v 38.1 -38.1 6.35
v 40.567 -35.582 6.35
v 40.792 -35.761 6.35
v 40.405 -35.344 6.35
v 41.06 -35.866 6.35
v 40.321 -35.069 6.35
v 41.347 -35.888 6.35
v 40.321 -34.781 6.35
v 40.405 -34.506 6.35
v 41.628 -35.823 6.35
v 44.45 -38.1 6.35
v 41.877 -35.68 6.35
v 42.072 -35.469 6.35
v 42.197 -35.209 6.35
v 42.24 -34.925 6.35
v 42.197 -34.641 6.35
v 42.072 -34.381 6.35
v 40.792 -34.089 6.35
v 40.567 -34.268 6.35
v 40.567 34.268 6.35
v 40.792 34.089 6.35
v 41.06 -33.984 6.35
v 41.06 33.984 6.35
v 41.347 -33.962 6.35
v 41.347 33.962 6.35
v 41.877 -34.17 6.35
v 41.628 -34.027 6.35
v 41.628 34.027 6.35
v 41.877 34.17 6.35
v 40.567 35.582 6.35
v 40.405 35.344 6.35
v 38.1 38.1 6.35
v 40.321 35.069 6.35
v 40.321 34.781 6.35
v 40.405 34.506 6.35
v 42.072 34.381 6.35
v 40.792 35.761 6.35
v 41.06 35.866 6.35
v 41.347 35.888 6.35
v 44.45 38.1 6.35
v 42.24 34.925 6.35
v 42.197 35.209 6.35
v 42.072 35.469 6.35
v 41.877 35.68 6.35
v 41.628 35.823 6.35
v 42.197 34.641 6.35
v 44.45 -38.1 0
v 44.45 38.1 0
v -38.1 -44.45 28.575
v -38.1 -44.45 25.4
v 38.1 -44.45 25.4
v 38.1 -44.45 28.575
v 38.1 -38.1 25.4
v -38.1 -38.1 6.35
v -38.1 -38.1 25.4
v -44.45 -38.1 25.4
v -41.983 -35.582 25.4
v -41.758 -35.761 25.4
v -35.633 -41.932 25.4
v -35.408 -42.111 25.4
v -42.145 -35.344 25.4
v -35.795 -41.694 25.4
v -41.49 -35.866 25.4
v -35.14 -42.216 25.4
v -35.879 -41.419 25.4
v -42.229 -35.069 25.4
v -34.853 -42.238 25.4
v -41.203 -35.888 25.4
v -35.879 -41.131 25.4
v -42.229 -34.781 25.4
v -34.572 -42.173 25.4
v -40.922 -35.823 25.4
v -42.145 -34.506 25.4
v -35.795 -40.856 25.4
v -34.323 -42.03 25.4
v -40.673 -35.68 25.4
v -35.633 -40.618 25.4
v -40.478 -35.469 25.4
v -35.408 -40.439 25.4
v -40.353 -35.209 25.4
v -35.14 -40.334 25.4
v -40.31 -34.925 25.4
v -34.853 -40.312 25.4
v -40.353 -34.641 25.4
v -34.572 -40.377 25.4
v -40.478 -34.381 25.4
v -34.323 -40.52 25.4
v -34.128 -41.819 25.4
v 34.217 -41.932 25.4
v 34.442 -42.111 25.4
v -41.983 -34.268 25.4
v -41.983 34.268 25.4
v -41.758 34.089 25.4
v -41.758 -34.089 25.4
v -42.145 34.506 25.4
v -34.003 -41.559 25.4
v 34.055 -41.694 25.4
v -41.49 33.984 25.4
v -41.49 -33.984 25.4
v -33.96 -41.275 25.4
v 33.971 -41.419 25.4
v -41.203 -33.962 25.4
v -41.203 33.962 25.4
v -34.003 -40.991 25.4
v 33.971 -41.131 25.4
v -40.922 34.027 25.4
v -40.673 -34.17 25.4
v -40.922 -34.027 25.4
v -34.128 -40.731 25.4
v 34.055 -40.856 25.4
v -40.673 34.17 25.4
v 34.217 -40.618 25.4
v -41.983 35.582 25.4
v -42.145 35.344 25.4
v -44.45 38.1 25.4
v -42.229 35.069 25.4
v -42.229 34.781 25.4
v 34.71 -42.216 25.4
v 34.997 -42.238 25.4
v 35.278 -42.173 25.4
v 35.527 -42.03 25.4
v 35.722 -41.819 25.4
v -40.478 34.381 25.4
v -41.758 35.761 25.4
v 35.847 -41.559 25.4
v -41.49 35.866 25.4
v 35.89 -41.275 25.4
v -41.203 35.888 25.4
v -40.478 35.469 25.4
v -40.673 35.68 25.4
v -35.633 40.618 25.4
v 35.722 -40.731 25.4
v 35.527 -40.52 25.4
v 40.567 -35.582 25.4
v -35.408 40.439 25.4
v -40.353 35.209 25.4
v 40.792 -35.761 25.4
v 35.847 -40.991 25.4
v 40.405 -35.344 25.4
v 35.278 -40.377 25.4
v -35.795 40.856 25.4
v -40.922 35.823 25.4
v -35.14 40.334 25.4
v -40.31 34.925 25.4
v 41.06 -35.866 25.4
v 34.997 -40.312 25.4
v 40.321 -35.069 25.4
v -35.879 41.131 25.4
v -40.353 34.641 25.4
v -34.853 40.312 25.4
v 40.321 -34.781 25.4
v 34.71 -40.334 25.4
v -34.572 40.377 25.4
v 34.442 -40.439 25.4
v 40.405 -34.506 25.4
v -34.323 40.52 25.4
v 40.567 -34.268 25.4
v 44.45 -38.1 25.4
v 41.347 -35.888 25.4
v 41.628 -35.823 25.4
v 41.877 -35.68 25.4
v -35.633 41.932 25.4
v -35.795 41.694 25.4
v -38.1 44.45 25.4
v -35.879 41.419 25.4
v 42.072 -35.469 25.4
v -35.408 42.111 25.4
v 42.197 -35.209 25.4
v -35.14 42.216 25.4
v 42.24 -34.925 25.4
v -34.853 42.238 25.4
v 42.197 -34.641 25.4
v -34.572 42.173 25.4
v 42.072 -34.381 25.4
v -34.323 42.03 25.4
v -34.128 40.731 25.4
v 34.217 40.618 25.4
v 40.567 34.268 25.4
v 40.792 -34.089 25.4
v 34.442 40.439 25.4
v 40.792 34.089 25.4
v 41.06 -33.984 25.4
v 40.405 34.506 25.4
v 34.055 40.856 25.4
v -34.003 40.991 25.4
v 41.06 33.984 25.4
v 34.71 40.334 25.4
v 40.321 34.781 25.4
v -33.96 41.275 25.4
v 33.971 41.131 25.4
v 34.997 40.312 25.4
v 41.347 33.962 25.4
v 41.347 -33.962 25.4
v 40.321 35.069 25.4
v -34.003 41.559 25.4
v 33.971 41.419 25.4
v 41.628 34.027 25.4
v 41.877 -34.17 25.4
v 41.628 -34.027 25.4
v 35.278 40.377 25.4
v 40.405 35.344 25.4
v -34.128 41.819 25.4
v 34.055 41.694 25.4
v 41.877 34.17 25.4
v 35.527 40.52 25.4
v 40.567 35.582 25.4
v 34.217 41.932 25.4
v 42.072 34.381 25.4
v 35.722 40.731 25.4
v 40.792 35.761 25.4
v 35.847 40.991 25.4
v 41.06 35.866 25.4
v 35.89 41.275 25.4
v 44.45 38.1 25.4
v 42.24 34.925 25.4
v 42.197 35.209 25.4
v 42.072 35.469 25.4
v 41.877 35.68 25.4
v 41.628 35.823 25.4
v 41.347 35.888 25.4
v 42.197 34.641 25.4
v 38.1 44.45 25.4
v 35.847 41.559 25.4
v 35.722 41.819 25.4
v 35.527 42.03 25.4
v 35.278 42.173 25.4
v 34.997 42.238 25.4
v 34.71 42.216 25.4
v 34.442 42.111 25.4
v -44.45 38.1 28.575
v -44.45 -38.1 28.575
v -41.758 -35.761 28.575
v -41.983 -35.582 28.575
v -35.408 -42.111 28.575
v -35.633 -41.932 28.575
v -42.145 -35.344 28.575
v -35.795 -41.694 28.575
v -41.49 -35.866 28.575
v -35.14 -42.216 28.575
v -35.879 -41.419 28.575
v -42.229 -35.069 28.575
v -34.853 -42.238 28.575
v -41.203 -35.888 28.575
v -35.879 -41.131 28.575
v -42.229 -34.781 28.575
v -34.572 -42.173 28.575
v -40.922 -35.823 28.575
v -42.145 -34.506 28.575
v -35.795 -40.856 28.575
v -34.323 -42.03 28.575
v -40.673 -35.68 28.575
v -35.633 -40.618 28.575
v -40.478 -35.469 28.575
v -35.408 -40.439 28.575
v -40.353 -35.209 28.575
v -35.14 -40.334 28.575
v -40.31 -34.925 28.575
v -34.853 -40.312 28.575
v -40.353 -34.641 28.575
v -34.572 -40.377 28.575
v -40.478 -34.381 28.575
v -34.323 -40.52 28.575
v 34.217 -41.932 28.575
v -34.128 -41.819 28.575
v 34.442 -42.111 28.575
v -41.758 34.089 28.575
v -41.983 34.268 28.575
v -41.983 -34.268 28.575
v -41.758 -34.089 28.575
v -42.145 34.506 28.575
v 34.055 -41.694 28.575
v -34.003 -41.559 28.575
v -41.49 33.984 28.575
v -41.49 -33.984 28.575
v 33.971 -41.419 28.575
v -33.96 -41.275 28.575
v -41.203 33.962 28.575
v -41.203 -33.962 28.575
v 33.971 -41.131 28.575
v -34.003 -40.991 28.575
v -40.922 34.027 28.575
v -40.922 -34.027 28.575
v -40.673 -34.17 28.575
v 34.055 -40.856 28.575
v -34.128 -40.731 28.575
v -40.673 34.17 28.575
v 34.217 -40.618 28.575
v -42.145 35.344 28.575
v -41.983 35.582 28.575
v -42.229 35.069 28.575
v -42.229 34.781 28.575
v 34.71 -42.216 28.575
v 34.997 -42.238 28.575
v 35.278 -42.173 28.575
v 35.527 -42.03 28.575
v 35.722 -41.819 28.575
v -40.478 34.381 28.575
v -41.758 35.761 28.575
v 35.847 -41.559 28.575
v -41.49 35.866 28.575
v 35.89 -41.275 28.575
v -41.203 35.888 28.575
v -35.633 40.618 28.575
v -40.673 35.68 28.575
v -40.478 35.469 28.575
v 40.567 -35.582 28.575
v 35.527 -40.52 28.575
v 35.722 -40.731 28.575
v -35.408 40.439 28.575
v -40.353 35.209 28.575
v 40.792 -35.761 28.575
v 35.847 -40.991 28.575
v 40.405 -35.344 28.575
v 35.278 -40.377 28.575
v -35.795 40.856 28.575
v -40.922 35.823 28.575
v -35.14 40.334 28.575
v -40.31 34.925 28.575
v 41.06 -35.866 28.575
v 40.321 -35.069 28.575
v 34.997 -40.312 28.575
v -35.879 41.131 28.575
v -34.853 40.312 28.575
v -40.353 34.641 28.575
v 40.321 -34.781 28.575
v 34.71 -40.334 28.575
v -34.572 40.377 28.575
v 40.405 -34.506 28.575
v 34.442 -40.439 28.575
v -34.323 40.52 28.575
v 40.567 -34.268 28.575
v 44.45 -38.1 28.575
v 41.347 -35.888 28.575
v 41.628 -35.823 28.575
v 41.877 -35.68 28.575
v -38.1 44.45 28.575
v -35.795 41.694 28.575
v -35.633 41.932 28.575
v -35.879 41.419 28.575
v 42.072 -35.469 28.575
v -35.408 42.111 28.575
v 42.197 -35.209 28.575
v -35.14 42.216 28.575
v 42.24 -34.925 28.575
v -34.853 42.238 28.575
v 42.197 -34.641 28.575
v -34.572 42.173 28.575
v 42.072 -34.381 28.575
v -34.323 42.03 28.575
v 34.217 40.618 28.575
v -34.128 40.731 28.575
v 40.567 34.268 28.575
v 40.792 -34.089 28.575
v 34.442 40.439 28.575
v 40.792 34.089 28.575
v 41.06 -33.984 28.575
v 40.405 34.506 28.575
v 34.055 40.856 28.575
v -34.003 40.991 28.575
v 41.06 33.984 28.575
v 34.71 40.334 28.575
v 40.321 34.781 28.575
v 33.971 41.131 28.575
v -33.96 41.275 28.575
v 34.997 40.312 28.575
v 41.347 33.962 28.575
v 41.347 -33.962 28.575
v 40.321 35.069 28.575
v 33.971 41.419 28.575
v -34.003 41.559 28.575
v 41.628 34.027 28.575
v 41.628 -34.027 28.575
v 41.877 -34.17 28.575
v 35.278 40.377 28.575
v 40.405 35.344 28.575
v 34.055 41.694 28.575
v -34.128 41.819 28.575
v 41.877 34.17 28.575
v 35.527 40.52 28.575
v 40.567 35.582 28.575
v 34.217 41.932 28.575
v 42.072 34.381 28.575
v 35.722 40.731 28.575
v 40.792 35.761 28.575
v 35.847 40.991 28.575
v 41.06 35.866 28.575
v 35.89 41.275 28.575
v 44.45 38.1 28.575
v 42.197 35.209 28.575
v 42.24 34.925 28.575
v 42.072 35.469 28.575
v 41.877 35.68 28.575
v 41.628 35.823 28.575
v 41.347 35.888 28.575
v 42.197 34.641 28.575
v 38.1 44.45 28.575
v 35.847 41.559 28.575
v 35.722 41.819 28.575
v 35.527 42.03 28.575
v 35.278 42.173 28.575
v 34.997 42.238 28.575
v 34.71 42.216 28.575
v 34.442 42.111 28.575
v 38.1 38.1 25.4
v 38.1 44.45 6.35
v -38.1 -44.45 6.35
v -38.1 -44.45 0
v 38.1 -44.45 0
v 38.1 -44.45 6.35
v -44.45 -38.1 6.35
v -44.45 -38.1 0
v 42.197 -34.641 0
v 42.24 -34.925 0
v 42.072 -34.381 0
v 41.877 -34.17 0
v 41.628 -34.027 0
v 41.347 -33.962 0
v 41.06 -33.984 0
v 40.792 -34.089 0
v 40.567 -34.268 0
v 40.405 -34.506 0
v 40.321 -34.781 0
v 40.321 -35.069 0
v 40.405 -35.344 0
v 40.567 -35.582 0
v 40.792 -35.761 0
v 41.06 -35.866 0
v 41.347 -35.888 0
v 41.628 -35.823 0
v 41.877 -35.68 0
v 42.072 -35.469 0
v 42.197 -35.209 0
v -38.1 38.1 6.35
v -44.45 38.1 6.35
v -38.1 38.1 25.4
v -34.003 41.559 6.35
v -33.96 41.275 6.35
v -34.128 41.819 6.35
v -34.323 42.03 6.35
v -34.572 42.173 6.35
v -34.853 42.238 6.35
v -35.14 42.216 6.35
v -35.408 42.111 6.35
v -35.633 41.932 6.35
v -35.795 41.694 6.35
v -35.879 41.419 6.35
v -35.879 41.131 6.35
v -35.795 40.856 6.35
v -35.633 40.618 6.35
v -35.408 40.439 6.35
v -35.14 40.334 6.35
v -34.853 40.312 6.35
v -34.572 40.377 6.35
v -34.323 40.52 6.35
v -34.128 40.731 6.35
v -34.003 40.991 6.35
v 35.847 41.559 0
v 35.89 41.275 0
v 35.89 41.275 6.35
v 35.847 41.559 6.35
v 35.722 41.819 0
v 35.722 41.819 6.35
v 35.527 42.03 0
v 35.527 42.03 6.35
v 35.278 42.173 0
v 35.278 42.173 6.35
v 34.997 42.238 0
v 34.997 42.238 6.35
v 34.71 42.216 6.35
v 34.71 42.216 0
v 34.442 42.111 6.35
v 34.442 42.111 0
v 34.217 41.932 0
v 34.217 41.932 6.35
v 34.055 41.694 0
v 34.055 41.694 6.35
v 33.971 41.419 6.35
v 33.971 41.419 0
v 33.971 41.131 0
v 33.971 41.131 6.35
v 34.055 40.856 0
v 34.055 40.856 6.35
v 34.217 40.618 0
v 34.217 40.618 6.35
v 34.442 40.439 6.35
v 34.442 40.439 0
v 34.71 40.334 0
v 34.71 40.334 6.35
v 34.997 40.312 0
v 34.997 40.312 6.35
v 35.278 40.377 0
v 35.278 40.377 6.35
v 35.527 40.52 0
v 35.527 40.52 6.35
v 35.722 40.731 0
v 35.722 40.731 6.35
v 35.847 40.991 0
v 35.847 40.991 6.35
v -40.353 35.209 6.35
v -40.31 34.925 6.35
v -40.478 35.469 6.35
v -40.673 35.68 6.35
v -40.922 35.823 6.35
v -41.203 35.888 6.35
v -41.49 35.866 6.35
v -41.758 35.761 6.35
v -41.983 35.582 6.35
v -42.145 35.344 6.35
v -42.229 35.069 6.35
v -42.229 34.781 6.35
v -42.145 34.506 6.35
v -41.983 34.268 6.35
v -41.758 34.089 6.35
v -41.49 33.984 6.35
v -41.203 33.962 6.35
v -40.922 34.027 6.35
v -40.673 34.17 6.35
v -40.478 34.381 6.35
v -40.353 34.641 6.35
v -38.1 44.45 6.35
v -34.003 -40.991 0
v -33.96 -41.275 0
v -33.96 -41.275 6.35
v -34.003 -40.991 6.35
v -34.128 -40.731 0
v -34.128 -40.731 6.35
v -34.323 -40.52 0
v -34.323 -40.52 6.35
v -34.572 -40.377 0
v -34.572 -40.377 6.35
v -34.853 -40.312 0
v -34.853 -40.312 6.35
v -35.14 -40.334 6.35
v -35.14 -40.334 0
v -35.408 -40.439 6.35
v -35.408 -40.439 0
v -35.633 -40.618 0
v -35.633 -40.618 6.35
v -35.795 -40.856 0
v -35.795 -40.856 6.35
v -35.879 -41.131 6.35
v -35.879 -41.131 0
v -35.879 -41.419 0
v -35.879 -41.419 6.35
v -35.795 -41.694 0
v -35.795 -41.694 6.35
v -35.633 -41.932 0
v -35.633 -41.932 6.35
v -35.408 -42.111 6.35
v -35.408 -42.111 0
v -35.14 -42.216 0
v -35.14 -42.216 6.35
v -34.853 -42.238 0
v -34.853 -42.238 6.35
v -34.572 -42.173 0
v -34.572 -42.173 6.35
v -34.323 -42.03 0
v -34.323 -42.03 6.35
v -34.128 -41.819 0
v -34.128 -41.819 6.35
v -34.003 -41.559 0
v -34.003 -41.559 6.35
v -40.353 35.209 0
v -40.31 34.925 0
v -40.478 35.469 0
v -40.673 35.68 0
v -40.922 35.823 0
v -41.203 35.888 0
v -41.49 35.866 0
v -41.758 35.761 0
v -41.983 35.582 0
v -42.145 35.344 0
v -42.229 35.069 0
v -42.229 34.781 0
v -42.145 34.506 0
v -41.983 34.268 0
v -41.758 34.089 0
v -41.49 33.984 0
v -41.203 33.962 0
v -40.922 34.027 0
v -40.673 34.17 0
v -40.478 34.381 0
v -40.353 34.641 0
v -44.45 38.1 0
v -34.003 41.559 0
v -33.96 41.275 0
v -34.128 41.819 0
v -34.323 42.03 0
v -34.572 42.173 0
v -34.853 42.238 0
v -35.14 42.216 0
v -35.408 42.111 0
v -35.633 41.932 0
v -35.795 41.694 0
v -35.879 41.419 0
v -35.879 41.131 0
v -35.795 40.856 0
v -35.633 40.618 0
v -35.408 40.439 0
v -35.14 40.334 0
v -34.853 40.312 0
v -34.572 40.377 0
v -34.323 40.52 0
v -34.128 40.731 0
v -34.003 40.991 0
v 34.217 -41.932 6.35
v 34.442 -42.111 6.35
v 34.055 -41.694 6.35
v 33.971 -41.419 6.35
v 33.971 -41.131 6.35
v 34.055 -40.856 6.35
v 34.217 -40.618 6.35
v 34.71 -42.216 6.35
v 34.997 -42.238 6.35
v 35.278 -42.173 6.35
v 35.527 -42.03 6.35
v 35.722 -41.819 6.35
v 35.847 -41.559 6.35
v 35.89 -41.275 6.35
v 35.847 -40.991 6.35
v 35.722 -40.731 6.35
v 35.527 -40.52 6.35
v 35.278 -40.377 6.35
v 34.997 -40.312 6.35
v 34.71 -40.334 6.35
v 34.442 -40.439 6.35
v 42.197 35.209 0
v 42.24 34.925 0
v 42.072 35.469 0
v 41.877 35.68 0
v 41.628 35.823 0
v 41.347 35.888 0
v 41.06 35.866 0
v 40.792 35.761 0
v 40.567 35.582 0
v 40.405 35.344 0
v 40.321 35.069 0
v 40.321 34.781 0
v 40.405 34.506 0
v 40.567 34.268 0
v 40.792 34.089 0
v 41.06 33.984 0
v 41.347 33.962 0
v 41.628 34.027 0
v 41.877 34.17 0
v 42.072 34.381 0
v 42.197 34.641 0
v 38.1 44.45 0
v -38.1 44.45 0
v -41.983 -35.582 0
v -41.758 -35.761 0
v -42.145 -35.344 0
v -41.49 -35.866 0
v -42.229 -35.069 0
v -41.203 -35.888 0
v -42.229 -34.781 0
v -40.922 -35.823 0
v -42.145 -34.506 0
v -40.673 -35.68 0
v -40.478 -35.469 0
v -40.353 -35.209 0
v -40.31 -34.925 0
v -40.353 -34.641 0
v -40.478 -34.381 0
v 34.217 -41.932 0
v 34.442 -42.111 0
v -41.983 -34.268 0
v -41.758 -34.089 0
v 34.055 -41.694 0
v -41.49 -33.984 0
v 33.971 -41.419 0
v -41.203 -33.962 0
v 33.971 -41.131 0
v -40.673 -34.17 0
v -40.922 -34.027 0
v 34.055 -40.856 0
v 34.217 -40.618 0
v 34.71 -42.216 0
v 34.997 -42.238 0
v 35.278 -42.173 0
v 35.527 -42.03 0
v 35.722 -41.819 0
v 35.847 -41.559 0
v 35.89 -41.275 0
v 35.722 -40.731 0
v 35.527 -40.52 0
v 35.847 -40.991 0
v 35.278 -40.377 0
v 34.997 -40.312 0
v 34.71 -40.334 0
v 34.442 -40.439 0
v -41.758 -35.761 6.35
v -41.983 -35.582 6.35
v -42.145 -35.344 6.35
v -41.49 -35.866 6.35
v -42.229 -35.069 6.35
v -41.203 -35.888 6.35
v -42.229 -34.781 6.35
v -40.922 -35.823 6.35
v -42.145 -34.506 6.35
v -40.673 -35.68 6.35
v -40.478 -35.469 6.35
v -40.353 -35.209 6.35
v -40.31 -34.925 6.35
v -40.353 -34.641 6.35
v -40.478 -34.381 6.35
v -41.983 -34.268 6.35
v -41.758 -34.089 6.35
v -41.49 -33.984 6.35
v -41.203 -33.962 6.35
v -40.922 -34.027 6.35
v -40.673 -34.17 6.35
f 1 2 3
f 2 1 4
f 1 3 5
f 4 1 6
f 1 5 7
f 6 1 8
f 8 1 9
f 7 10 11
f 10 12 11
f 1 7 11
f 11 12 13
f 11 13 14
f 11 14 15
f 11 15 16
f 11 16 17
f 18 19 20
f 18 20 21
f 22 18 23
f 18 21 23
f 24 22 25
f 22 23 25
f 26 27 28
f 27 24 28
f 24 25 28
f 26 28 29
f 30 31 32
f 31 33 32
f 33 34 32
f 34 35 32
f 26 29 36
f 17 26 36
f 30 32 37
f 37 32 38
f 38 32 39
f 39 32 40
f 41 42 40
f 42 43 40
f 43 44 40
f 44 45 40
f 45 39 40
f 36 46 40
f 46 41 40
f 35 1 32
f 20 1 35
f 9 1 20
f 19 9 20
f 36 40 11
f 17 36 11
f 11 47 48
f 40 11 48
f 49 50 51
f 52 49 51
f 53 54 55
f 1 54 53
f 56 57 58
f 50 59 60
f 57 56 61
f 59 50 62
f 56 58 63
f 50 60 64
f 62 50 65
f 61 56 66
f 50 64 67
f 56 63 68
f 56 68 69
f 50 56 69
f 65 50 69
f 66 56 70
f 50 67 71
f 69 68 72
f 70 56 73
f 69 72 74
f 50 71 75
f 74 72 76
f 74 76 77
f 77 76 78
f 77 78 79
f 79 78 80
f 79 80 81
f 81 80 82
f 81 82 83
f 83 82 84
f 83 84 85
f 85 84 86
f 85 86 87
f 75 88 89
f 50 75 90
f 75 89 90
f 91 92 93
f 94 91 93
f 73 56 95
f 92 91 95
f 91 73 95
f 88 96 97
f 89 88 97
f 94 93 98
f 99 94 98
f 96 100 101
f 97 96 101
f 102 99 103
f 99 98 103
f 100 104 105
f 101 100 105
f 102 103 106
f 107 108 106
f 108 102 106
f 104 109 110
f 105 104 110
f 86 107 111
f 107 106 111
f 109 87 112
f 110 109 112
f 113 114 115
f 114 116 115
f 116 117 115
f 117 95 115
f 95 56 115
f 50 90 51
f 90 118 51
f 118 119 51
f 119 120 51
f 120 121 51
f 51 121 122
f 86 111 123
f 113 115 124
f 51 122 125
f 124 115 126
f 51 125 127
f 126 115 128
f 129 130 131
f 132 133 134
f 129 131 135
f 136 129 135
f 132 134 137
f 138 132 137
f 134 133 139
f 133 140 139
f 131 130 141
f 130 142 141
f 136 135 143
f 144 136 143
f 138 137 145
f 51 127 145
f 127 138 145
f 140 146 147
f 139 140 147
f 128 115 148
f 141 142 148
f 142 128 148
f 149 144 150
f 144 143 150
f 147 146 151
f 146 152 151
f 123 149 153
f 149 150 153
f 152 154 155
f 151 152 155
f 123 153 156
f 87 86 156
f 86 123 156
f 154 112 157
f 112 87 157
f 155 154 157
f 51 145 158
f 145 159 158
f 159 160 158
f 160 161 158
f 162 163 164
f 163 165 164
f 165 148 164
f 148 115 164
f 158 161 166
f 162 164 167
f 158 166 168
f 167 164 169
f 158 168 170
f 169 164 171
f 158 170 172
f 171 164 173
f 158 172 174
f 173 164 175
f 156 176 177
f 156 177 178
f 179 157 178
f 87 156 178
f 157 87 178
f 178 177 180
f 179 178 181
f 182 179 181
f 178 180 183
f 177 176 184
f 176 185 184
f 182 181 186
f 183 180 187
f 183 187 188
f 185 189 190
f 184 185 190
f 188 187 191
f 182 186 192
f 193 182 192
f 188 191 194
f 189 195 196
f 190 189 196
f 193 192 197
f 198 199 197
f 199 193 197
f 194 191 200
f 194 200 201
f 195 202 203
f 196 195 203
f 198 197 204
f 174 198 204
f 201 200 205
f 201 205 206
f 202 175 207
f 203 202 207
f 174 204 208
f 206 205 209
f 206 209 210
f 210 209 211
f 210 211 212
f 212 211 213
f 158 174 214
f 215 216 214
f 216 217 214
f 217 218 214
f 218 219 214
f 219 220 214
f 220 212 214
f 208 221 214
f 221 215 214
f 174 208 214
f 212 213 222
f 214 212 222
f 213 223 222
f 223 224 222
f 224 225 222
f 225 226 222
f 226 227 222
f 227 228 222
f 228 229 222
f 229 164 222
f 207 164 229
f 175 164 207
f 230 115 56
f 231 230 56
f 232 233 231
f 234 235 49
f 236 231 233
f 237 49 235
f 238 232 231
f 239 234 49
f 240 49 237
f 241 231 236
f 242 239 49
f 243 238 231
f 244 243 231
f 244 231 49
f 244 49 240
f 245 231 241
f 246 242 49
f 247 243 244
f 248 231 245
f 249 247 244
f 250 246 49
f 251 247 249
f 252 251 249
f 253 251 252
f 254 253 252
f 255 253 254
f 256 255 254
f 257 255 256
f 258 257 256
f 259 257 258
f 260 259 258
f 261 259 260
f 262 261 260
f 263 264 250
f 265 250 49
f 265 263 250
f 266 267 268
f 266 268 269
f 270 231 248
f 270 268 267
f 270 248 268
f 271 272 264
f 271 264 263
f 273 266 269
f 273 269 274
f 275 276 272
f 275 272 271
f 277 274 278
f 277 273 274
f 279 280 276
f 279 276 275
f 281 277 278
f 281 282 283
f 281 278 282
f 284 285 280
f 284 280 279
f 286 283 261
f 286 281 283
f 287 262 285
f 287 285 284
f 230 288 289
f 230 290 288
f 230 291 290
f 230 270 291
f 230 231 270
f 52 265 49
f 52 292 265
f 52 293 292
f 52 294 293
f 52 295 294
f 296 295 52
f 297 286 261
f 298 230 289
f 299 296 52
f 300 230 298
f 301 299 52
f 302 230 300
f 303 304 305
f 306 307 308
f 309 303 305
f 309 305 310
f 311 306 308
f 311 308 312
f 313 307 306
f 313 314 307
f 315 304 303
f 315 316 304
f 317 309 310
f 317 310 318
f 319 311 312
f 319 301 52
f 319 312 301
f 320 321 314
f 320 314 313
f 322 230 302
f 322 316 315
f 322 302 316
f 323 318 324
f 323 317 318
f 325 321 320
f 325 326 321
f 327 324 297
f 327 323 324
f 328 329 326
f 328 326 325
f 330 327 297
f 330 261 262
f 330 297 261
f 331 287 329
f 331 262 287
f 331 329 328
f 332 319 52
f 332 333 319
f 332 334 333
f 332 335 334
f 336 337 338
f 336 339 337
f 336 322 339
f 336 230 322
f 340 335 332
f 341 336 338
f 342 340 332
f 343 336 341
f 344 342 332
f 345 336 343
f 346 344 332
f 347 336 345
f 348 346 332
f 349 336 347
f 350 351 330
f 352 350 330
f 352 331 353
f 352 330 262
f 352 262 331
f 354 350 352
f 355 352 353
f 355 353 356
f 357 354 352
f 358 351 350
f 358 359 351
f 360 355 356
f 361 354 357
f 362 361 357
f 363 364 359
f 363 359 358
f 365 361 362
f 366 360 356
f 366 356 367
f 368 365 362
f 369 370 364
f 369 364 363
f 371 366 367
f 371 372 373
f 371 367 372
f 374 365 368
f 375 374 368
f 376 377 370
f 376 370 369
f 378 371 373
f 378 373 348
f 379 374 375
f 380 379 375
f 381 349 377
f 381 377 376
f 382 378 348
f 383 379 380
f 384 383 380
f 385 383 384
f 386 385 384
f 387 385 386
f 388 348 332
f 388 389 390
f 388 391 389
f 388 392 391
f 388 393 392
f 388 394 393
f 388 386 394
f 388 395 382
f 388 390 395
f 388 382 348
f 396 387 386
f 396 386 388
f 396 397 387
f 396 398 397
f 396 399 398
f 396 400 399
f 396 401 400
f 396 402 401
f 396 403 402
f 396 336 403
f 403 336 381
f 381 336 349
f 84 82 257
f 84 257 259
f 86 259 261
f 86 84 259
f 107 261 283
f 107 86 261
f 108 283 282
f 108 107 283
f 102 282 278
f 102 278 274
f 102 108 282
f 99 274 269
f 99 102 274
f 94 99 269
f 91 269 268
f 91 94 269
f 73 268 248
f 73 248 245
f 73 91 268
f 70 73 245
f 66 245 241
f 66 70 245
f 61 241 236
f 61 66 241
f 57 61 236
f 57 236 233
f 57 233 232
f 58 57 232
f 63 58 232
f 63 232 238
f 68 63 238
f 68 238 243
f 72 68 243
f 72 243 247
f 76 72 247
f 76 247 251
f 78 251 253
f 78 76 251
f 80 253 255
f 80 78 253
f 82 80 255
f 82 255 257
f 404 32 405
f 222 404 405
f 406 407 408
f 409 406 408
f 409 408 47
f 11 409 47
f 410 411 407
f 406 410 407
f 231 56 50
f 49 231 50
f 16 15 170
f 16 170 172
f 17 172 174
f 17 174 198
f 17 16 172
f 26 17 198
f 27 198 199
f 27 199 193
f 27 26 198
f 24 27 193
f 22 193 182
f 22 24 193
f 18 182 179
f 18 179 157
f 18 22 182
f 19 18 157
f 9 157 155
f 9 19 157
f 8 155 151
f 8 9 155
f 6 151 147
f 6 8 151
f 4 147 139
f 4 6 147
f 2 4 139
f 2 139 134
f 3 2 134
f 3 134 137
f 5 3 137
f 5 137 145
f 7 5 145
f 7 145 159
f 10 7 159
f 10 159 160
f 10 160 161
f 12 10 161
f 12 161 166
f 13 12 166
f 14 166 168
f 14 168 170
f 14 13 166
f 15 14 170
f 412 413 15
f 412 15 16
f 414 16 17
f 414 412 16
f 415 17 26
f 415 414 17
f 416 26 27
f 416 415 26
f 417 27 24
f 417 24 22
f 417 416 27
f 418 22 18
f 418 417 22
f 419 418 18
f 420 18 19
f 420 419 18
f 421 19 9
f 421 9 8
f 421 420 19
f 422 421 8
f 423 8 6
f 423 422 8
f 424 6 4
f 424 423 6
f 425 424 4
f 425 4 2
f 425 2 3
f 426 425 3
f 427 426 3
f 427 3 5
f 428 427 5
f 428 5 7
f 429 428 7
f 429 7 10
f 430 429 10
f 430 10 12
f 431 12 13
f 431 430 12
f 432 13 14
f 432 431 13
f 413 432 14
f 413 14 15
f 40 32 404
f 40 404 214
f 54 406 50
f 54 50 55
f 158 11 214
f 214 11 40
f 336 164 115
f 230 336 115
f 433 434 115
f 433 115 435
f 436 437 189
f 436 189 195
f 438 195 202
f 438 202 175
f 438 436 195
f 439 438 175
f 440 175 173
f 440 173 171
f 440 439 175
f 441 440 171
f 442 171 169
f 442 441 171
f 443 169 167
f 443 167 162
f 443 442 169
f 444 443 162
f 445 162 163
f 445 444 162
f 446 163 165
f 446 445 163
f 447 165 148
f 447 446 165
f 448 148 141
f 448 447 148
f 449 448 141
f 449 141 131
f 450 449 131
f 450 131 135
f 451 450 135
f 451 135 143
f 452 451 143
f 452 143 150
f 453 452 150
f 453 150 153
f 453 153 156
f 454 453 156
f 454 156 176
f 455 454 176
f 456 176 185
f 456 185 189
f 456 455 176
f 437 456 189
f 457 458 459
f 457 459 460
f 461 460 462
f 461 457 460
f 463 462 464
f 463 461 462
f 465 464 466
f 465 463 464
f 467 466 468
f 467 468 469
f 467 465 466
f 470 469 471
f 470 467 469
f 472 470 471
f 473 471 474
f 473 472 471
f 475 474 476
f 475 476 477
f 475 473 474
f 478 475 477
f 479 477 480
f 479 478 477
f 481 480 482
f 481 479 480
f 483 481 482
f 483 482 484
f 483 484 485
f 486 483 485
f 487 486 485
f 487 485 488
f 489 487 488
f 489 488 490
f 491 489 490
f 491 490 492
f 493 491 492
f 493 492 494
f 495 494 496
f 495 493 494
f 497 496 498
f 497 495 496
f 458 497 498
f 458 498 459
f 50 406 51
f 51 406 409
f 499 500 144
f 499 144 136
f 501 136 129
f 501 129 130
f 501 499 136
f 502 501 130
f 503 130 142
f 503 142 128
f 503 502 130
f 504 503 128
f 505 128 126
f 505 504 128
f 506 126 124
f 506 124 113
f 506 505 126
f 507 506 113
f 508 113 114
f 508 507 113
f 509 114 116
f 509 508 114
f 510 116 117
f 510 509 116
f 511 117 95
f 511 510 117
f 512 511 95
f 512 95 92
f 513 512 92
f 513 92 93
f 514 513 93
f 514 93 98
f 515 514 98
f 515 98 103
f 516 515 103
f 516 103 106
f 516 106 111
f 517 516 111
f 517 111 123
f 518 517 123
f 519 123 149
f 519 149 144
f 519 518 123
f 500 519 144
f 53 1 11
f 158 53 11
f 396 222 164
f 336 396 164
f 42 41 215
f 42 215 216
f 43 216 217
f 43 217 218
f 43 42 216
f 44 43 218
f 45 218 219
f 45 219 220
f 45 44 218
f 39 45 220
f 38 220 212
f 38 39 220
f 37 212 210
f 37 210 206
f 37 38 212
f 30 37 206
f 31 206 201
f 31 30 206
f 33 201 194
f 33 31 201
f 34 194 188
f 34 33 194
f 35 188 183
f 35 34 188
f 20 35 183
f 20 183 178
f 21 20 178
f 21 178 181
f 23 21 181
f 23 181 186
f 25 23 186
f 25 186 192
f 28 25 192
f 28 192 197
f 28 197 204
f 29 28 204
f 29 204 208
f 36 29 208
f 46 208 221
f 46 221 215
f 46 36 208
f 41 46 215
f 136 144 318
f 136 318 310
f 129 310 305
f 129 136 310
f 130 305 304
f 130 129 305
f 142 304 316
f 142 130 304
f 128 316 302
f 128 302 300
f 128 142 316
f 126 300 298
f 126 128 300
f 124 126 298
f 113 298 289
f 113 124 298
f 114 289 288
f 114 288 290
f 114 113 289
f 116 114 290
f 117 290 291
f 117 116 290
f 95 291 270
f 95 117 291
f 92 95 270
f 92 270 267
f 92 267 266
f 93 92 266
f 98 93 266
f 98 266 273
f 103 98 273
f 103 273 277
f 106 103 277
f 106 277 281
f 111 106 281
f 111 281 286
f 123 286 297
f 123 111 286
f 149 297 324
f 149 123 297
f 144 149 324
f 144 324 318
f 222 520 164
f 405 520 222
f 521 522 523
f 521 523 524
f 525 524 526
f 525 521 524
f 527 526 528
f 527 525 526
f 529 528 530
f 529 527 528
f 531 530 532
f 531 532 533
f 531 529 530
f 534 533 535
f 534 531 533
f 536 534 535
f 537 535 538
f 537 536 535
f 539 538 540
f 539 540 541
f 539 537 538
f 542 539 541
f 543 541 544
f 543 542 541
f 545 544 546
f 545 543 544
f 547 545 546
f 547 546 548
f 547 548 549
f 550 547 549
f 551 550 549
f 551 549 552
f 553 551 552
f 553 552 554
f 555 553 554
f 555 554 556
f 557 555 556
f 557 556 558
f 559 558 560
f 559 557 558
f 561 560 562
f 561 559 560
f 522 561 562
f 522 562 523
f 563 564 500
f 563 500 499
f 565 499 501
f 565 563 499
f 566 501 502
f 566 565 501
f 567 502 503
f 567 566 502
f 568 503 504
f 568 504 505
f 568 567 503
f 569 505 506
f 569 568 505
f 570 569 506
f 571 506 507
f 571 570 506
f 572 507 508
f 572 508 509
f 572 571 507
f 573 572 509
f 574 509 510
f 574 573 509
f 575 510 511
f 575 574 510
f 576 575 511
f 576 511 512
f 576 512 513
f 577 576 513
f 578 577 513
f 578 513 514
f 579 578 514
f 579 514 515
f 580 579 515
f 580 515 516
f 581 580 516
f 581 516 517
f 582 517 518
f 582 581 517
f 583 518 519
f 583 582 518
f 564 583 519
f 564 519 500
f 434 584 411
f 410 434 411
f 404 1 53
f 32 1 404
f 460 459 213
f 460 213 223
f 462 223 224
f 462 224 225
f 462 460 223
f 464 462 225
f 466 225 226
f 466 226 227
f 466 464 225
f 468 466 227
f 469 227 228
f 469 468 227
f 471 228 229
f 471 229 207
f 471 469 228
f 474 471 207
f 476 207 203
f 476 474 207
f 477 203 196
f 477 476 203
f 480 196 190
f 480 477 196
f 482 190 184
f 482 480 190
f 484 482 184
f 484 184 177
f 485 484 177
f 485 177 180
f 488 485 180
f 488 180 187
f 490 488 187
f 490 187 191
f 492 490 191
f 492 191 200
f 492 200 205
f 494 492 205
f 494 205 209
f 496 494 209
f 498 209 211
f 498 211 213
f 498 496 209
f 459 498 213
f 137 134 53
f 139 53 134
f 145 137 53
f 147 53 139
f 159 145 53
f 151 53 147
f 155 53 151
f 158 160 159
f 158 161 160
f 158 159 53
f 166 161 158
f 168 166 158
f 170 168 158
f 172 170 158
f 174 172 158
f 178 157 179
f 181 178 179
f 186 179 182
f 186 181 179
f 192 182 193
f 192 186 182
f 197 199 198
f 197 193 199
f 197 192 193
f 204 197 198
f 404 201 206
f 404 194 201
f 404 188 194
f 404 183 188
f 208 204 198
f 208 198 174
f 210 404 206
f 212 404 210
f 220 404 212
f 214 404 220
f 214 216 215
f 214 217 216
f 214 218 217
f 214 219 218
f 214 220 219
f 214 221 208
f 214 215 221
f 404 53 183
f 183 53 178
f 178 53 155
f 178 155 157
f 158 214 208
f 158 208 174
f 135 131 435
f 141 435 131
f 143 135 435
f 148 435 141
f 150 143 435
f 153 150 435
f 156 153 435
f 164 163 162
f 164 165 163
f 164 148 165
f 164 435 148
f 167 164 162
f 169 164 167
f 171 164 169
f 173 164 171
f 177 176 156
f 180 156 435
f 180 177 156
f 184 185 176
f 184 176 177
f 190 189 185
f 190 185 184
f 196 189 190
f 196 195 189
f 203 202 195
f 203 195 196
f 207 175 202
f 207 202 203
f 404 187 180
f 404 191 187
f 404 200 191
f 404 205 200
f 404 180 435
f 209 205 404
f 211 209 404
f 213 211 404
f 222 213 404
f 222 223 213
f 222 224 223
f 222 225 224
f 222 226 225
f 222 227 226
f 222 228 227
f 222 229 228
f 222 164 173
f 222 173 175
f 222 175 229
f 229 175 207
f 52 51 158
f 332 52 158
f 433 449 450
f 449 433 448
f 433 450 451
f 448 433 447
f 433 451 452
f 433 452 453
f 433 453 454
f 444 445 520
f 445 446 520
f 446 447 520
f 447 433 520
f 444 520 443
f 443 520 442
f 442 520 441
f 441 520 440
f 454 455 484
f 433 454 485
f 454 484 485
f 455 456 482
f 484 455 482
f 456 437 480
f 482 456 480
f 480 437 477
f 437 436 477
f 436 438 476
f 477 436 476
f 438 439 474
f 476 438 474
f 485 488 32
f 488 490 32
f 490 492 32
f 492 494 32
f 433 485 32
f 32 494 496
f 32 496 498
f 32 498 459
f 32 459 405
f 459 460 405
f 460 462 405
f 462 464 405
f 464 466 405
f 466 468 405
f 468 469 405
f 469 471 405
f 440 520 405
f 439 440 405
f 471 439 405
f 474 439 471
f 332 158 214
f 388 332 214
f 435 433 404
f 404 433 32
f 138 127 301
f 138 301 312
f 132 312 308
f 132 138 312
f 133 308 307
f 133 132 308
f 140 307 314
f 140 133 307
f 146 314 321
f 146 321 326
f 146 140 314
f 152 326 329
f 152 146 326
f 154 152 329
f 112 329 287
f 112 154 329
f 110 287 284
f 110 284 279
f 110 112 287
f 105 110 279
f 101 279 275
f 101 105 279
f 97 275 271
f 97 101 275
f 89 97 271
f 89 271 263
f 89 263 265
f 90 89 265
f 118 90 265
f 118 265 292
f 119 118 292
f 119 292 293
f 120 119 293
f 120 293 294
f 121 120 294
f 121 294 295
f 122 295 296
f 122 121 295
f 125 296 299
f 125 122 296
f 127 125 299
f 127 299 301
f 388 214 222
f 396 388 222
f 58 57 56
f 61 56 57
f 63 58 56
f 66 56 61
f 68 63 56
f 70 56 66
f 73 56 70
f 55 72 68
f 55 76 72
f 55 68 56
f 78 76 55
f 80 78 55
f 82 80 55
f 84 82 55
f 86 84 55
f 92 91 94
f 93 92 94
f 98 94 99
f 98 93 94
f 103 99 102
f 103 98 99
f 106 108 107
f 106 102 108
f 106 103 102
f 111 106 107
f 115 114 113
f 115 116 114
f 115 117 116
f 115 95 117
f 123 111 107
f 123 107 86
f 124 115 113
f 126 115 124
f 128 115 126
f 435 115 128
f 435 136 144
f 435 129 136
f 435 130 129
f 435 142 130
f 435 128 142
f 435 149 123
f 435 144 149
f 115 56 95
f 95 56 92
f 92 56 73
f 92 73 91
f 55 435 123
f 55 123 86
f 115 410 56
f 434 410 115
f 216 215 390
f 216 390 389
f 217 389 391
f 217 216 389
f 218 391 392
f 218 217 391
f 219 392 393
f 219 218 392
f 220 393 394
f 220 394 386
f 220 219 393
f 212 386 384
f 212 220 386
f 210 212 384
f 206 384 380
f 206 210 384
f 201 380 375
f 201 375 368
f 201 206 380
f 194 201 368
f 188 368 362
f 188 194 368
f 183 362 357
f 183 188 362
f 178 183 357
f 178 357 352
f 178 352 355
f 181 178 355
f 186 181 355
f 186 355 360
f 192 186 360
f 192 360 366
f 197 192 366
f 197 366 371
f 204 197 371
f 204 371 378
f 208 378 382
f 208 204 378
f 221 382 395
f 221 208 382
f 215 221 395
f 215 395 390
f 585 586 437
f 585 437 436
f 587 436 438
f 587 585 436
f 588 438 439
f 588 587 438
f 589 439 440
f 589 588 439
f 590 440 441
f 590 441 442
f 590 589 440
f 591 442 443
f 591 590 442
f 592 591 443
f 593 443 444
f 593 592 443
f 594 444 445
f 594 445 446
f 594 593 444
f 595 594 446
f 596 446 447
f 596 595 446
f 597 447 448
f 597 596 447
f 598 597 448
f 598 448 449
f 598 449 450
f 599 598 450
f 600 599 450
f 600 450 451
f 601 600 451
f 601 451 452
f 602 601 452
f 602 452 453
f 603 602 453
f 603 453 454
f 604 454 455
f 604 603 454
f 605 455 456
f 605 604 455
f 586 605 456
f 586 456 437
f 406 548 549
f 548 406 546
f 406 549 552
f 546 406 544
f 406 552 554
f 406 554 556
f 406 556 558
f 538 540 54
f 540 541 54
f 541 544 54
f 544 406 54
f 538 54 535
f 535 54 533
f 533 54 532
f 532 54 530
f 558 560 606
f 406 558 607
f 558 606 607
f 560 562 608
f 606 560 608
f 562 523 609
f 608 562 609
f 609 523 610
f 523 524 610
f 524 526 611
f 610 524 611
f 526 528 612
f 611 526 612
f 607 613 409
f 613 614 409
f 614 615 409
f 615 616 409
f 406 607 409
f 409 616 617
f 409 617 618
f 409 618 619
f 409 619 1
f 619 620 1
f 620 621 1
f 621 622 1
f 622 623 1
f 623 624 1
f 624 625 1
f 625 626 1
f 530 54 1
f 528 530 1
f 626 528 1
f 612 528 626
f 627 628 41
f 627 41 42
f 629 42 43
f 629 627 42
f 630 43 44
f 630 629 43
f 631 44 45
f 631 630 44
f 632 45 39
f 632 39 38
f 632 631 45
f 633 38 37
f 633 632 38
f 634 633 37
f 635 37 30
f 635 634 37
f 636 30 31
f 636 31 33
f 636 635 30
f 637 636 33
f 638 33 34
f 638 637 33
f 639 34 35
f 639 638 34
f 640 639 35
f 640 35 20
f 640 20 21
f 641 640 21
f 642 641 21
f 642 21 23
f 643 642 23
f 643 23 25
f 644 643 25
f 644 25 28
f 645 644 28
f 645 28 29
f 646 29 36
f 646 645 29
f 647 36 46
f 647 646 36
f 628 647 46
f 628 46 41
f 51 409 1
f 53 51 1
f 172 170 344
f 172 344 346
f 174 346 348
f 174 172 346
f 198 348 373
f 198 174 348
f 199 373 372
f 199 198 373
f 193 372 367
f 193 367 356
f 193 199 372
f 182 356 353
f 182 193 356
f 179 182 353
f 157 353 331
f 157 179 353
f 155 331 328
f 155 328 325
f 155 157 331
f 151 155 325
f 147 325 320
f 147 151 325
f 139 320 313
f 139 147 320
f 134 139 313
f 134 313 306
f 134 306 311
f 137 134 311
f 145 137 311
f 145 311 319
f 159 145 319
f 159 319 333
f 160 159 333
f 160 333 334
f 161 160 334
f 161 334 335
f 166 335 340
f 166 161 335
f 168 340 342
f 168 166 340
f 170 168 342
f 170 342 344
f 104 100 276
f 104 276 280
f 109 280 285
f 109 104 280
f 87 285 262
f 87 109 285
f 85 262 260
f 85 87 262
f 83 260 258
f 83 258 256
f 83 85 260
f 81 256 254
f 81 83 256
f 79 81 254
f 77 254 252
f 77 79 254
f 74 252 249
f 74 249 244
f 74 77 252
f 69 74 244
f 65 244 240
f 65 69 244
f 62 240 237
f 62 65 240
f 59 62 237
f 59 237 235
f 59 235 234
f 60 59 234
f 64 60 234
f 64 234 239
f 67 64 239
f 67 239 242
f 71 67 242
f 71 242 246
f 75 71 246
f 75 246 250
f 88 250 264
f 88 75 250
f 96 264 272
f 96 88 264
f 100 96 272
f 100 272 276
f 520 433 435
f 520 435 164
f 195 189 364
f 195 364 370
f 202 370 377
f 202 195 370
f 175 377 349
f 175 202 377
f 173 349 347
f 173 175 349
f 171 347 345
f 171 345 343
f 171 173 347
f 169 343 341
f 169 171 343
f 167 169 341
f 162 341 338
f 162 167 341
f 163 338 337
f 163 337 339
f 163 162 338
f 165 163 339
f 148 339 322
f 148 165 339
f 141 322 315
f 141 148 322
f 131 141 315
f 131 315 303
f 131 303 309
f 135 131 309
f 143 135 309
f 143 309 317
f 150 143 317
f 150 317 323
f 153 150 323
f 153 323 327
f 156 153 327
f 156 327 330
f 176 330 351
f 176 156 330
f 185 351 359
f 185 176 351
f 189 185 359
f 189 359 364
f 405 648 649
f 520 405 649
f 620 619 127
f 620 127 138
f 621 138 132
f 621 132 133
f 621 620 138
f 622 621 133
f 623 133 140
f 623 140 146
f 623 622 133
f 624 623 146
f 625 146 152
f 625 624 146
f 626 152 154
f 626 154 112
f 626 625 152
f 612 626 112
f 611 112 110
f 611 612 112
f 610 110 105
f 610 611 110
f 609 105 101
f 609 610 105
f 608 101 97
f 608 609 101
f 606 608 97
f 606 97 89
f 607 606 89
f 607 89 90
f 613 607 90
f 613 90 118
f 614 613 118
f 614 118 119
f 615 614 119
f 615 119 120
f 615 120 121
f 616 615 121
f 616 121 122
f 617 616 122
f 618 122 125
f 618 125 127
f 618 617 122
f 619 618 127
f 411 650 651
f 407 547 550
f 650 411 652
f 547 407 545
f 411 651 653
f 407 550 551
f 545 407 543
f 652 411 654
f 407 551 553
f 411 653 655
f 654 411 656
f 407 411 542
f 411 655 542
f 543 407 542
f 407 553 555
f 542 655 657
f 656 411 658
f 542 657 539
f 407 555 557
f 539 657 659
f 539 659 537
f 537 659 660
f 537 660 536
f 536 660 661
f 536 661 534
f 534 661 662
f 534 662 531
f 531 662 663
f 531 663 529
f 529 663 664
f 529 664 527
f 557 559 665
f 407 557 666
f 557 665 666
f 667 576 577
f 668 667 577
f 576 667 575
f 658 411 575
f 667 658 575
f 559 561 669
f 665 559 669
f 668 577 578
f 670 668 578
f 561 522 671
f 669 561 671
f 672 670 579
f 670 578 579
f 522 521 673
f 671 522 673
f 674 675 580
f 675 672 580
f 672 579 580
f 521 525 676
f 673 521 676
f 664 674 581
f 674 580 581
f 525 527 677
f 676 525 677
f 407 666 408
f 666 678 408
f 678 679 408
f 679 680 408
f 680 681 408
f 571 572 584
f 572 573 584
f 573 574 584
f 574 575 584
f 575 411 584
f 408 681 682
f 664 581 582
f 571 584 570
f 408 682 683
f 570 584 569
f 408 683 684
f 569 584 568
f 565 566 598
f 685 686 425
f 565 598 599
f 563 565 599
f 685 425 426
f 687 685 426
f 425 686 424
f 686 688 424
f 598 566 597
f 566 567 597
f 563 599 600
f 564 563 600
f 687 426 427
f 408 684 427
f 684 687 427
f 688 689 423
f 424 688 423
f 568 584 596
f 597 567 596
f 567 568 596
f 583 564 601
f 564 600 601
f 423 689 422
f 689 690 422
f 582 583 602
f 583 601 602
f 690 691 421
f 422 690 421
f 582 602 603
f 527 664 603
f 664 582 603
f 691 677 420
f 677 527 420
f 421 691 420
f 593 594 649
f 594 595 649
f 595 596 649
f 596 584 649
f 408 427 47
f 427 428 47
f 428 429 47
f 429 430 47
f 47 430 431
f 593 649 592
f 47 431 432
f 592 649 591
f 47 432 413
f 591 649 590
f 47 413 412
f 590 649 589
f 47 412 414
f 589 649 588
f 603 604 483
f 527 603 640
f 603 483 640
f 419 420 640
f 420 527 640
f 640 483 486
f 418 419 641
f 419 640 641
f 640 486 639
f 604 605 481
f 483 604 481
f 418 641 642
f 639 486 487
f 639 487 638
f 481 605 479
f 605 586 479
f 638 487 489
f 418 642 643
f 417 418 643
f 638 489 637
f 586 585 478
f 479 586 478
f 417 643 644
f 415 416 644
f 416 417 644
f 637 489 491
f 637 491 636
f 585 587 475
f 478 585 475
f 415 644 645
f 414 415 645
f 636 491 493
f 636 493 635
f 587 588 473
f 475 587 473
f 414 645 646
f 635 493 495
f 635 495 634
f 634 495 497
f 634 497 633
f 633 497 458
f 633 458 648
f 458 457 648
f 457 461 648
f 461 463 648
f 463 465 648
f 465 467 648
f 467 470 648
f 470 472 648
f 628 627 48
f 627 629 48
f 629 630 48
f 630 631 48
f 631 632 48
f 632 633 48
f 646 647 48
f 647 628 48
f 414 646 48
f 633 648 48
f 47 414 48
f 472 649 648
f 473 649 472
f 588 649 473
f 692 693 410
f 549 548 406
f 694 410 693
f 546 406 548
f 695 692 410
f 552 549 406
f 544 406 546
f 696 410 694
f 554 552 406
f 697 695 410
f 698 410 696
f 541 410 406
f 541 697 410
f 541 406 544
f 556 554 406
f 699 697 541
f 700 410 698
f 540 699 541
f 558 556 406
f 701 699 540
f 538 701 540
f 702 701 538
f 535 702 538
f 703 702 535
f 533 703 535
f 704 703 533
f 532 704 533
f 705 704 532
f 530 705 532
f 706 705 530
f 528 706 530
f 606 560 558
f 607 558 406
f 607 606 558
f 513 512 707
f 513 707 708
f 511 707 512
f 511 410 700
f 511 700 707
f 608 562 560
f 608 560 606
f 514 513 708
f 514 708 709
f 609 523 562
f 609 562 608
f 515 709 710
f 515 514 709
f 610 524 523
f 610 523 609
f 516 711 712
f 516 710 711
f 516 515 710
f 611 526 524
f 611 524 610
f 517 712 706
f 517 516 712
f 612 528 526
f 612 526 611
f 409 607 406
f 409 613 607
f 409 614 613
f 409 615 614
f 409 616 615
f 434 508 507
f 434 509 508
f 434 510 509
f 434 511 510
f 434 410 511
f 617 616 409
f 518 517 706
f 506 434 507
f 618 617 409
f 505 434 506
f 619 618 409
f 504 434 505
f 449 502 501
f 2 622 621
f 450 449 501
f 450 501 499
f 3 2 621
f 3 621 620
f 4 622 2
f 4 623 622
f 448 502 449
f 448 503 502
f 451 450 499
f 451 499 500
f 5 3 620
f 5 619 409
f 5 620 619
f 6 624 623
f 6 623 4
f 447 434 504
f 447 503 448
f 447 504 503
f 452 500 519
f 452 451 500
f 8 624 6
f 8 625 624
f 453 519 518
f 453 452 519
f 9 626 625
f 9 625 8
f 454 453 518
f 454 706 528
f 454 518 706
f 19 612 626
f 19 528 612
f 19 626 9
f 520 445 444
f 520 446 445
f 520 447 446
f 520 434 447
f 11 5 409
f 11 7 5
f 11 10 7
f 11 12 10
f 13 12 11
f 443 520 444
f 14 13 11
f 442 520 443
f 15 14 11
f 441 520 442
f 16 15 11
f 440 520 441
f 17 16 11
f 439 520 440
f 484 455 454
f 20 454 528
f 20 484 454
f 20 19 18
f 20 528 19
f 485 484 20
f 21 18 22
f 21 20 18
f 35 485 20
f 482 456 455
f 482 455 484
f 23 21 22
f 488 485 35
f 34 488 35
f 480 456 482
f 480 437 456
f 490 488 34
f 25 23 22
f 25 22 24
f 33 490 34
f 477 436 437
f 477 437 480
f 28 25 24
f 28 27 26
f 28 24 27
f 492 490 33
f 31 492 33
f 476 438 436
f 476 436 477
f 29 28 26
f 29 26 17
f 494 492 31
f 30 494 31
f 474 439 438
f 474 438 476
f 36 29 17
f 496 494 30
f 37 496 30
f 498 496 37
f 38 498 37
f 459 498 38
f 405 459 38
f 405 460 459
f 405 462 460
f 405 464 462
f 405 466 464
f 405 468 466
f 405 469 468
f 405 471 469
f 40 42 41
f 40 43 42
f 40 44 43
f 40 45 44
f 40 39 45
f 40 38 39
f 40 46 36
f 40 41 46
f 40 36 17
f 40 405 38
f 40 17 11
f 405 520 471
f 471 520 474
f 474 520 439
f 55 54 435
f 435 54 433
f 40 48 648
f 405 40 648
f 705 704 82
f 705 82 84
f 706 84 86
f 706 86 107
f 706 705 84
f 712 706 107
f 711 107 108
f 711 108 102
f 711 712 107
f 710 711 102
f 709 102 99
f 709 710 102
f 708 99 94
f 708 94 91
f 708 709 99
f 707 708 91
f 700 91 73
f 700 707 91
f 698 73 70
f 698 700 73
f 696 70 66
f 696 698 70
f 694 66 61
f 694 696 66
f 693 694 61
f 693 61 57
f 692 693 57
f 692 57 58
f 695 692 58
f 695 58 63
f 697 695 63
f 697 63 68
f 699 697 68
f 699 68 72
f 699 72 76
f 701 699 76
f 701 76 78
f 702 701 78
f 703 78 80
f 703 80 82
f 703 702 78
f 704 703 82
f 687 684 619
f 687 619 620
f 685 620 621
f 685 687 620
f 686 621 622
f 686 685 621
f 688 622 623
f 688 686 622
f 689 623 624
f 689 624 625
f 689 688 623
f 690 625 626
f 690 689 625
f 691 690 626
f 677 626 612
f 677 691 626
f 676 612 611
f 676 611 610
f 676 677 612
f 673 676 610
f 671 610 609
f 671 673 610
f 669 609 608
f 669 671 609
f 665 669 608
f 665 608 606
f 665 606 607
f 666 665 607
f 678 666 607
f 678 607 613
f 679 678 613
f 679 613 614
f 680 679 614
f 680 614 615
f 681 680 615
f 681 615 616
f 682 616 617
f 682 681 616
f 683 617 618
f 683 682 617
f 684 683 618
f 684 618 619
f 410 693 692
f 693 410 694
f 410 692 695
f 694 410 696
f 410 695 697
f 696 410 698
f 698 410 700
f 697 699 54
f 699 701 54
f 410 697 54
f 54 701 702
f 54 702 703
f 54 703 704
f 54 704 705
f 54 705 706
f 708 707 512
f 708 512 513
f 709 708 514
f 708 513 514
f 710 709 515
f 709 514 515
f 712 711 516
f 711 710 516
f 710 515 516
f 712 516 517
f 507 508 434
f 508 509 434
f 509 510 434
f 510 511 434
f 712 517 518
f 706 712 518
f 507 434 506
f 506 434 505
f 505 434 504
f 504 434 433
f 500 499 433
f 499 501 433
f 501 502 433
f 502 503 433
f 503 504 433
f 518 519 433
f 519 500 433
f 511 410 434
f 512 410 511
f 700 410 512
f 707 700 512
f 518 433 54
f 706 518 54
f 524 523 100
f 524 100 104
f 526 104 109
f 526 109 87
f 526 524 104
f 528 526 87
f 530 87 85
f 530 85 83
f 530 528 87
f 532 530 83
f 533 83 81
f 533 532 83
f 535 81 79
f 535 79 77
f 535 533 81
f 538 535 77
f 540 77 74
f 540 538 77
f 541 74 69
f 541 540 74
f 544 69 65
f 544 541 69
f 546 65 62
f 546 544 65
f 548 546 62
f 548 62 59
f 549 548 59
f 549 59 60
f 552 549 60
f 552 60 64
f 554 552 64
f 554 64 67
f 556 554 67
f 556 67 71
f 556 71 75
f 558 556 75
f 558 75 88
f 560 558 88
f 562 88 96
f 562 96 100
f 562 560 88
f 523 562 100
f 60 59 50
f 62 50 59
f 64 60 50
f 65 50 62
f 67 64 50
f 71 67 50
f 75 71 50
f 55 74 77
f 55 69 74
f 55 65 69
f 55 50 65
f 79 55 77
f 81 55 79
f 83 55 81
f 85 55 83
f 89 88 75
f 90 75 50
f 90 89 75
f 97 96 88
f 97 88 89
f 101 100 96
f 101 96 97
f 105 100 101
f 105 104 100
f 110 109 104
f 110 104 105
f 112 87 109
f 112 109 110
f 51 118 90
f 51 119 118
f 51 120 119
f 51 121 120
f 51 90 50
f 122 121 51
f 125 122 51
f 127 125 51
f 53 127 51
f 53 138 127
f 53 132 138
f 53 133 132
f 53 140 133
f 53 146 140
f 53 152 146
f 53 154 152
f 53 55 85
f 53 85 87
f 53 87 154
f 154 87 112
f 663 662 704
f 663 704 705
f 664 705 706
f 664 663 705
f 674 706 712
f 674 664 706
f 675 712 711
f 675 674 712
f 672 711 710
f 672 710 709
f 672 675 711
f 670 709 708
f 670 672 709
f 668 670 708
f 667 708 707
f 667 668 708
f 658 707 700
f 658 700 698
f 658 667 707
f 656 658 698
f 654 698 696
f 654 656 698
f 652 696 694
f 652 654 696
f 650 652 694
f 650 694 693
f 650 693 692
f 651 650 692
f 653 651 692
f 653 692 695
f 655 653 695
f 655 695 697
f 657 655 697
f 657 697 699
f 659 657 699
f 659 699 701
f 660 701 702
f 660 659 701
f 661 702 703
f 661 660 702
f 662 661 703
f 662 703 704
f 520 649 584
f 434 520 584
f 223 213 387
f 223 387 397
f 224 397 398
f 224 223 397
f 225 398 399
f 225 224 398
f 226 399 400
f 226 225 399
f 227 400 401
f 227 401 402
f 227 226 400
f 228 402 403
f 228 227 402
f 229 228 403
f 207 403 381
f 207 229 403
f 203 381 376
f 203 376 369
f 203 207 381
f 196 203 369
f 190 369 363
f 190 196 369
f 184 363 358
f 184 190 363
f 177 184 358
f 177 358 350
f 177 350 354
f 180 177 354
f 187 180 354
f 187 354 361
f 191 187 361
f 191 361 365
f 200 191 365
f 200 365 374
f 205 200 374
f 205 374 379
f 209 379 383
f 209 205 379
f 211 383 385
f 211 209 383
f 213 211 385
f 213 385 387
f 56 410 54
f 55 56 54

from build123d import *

# Parameters (mm, degrees)
F0_R     = 0.9652
F1_DEPTH = 6.35
F2_W     = 76.2
F2_H     = 6.35
F2_R     = 0.9652
F2_W_2   = 6.35
F2_H_2   = 76.2
F3_DEPTH = 19.05
F4_R     = 0.9652
F5_DEPTH = 3.175


with BuildPart() as f1:
    # F0 (on Top) → F1 (new body)
    with BuildSketch(Plane.XY):
        Polygon((38.1, 44.45), (-38.1, 44.45), (-44.45, 38.1), (-44.45, -38.1), (-38.1, -44.45), (38.1, -44.45), (44.45, -38.1), (44.45, 38.1), align=None)
        with Locations((-34.925, -41.275)):
            Circle(F0_R, mode=Mode.SUBTRACT)
        with Locations((-41.275, -34.925)):
            Circle(F0_R, mode=Mode.SUBTRACT)
        with Locations((34.925, -41.275)):
            Circle(F0_R, mode=Mode.SUBTRACT)
        with Locations((41.275, -34.925)):
            Circle(F0_R, mode=Mode.SUBTRACT)
        with Locations((-41.275, 34.925)):
            Circle(F0_R, mode=Mode.SUBTRACT)
        with Locations((-34.925, 41.275)):
            Circle(F0_R, mode=Mode.SUBTRACT)
        with Locations((41.275, 34.925)):
            Circle(F0_R, mode=Mode.SUBTRACT)
        with Locations((34.925, 41.275)):
            Circle(F0_R, mode=Mode.SUBTRACT)
    extrude(amount=F1_DEPTH)


with BuildPart() as f3:
    # F2 (on face) → F3 (new body)
    with BuildSketch(Plane.XY.offset(6.35)):
        with Locations((0, 41.275)):
            Rectangle(F2_W, F2_H)
        with Locations((-34.925, 41.275)):
            Circle(F2_R, mode=Mode.SUBTRACT)
        with Locations((34.925, 41.275)):
            Circle(F2_R, mode=Mode.SUBTRACT)
        with Locations((-41.275, 0)):
            Rectangle(F2_W_2, F2_H_2)
        with Locations((-41.275, -34.925)):
            Circle(F2_R, mode=Mode.SUBTRACT)
        with Locations((-41.275, 34.925)):
            Circle(F2_R, mode=Mode.SUBTRACT)
        with Locations((0, -41.275)):
            Rectangle(F2_W, F2_H)
        with Locations((-34.925, -41.275)):
            Circle(F2_R, mode=Mode.SUBTRACT)
        with Locations((34.925, -41.275)):
            Circle(F2_R, mode=Mode.SUBTRACT)
        with Locations((41.275, 0)):
            Rectangle(F2_W_2, F2_H_2)
        with Locations((41.275, -34.925)):
            Circle(F2_R, mode=Mode.SUBTRACT)
        with Locations((41.275, 34.925)):
            Circle(F2_R, mode=Mode.SUBTRACT)
    extrude(amount=F3_DEPTH)


with BuildPart() as f5:
    # F4 (on face) → F5 (new body)
    with BuildSketch(Plane.XY.offset(25.4)):
        Polygon((44.45, 38.1), (38.1, 44.45), (-38.1, 44.45), (-44.45, 38.1), (-44.45, -38.1), (-38.1, -44.45), (38.1, -44.45), (44.45, -38.1), align=None)
        with Locations((-34.925, -41.275)):
            Circle(F4_R, mode=Mode.SUBTRACT)
        with Locations((-41.275, -34.925)):
            Circle(F4_R, mode=Mode.SUBTRACT)
        with Locations((34.925, -41.275)):
            Circle(F4_R, mode=Mode.SUBTRACT)
        with Locations((41.275, -34.925)):
            Circle(F4_R, mode=Mode.SUBTRACT)
        with Locations((-41.275, 34.925)):
            Circle(F4_R, mode=Mode.SUBTRACT)
        with Locations((-34.925, 41.275)):
            Circle(F4_R, mode=Mode.SUBTRACT)
        with Locations((41.275, 34.925)):
            Circle(F4_R, mode=Mode.SUBTRACT)
        with Locations((34.925, 41.275)):
            Circle(F4_R, mode=Mode.SUBTRACT)
    extrude(amount=F5_DEPTH)


solid = Compound([f1.part, f3.part, f5.part])
